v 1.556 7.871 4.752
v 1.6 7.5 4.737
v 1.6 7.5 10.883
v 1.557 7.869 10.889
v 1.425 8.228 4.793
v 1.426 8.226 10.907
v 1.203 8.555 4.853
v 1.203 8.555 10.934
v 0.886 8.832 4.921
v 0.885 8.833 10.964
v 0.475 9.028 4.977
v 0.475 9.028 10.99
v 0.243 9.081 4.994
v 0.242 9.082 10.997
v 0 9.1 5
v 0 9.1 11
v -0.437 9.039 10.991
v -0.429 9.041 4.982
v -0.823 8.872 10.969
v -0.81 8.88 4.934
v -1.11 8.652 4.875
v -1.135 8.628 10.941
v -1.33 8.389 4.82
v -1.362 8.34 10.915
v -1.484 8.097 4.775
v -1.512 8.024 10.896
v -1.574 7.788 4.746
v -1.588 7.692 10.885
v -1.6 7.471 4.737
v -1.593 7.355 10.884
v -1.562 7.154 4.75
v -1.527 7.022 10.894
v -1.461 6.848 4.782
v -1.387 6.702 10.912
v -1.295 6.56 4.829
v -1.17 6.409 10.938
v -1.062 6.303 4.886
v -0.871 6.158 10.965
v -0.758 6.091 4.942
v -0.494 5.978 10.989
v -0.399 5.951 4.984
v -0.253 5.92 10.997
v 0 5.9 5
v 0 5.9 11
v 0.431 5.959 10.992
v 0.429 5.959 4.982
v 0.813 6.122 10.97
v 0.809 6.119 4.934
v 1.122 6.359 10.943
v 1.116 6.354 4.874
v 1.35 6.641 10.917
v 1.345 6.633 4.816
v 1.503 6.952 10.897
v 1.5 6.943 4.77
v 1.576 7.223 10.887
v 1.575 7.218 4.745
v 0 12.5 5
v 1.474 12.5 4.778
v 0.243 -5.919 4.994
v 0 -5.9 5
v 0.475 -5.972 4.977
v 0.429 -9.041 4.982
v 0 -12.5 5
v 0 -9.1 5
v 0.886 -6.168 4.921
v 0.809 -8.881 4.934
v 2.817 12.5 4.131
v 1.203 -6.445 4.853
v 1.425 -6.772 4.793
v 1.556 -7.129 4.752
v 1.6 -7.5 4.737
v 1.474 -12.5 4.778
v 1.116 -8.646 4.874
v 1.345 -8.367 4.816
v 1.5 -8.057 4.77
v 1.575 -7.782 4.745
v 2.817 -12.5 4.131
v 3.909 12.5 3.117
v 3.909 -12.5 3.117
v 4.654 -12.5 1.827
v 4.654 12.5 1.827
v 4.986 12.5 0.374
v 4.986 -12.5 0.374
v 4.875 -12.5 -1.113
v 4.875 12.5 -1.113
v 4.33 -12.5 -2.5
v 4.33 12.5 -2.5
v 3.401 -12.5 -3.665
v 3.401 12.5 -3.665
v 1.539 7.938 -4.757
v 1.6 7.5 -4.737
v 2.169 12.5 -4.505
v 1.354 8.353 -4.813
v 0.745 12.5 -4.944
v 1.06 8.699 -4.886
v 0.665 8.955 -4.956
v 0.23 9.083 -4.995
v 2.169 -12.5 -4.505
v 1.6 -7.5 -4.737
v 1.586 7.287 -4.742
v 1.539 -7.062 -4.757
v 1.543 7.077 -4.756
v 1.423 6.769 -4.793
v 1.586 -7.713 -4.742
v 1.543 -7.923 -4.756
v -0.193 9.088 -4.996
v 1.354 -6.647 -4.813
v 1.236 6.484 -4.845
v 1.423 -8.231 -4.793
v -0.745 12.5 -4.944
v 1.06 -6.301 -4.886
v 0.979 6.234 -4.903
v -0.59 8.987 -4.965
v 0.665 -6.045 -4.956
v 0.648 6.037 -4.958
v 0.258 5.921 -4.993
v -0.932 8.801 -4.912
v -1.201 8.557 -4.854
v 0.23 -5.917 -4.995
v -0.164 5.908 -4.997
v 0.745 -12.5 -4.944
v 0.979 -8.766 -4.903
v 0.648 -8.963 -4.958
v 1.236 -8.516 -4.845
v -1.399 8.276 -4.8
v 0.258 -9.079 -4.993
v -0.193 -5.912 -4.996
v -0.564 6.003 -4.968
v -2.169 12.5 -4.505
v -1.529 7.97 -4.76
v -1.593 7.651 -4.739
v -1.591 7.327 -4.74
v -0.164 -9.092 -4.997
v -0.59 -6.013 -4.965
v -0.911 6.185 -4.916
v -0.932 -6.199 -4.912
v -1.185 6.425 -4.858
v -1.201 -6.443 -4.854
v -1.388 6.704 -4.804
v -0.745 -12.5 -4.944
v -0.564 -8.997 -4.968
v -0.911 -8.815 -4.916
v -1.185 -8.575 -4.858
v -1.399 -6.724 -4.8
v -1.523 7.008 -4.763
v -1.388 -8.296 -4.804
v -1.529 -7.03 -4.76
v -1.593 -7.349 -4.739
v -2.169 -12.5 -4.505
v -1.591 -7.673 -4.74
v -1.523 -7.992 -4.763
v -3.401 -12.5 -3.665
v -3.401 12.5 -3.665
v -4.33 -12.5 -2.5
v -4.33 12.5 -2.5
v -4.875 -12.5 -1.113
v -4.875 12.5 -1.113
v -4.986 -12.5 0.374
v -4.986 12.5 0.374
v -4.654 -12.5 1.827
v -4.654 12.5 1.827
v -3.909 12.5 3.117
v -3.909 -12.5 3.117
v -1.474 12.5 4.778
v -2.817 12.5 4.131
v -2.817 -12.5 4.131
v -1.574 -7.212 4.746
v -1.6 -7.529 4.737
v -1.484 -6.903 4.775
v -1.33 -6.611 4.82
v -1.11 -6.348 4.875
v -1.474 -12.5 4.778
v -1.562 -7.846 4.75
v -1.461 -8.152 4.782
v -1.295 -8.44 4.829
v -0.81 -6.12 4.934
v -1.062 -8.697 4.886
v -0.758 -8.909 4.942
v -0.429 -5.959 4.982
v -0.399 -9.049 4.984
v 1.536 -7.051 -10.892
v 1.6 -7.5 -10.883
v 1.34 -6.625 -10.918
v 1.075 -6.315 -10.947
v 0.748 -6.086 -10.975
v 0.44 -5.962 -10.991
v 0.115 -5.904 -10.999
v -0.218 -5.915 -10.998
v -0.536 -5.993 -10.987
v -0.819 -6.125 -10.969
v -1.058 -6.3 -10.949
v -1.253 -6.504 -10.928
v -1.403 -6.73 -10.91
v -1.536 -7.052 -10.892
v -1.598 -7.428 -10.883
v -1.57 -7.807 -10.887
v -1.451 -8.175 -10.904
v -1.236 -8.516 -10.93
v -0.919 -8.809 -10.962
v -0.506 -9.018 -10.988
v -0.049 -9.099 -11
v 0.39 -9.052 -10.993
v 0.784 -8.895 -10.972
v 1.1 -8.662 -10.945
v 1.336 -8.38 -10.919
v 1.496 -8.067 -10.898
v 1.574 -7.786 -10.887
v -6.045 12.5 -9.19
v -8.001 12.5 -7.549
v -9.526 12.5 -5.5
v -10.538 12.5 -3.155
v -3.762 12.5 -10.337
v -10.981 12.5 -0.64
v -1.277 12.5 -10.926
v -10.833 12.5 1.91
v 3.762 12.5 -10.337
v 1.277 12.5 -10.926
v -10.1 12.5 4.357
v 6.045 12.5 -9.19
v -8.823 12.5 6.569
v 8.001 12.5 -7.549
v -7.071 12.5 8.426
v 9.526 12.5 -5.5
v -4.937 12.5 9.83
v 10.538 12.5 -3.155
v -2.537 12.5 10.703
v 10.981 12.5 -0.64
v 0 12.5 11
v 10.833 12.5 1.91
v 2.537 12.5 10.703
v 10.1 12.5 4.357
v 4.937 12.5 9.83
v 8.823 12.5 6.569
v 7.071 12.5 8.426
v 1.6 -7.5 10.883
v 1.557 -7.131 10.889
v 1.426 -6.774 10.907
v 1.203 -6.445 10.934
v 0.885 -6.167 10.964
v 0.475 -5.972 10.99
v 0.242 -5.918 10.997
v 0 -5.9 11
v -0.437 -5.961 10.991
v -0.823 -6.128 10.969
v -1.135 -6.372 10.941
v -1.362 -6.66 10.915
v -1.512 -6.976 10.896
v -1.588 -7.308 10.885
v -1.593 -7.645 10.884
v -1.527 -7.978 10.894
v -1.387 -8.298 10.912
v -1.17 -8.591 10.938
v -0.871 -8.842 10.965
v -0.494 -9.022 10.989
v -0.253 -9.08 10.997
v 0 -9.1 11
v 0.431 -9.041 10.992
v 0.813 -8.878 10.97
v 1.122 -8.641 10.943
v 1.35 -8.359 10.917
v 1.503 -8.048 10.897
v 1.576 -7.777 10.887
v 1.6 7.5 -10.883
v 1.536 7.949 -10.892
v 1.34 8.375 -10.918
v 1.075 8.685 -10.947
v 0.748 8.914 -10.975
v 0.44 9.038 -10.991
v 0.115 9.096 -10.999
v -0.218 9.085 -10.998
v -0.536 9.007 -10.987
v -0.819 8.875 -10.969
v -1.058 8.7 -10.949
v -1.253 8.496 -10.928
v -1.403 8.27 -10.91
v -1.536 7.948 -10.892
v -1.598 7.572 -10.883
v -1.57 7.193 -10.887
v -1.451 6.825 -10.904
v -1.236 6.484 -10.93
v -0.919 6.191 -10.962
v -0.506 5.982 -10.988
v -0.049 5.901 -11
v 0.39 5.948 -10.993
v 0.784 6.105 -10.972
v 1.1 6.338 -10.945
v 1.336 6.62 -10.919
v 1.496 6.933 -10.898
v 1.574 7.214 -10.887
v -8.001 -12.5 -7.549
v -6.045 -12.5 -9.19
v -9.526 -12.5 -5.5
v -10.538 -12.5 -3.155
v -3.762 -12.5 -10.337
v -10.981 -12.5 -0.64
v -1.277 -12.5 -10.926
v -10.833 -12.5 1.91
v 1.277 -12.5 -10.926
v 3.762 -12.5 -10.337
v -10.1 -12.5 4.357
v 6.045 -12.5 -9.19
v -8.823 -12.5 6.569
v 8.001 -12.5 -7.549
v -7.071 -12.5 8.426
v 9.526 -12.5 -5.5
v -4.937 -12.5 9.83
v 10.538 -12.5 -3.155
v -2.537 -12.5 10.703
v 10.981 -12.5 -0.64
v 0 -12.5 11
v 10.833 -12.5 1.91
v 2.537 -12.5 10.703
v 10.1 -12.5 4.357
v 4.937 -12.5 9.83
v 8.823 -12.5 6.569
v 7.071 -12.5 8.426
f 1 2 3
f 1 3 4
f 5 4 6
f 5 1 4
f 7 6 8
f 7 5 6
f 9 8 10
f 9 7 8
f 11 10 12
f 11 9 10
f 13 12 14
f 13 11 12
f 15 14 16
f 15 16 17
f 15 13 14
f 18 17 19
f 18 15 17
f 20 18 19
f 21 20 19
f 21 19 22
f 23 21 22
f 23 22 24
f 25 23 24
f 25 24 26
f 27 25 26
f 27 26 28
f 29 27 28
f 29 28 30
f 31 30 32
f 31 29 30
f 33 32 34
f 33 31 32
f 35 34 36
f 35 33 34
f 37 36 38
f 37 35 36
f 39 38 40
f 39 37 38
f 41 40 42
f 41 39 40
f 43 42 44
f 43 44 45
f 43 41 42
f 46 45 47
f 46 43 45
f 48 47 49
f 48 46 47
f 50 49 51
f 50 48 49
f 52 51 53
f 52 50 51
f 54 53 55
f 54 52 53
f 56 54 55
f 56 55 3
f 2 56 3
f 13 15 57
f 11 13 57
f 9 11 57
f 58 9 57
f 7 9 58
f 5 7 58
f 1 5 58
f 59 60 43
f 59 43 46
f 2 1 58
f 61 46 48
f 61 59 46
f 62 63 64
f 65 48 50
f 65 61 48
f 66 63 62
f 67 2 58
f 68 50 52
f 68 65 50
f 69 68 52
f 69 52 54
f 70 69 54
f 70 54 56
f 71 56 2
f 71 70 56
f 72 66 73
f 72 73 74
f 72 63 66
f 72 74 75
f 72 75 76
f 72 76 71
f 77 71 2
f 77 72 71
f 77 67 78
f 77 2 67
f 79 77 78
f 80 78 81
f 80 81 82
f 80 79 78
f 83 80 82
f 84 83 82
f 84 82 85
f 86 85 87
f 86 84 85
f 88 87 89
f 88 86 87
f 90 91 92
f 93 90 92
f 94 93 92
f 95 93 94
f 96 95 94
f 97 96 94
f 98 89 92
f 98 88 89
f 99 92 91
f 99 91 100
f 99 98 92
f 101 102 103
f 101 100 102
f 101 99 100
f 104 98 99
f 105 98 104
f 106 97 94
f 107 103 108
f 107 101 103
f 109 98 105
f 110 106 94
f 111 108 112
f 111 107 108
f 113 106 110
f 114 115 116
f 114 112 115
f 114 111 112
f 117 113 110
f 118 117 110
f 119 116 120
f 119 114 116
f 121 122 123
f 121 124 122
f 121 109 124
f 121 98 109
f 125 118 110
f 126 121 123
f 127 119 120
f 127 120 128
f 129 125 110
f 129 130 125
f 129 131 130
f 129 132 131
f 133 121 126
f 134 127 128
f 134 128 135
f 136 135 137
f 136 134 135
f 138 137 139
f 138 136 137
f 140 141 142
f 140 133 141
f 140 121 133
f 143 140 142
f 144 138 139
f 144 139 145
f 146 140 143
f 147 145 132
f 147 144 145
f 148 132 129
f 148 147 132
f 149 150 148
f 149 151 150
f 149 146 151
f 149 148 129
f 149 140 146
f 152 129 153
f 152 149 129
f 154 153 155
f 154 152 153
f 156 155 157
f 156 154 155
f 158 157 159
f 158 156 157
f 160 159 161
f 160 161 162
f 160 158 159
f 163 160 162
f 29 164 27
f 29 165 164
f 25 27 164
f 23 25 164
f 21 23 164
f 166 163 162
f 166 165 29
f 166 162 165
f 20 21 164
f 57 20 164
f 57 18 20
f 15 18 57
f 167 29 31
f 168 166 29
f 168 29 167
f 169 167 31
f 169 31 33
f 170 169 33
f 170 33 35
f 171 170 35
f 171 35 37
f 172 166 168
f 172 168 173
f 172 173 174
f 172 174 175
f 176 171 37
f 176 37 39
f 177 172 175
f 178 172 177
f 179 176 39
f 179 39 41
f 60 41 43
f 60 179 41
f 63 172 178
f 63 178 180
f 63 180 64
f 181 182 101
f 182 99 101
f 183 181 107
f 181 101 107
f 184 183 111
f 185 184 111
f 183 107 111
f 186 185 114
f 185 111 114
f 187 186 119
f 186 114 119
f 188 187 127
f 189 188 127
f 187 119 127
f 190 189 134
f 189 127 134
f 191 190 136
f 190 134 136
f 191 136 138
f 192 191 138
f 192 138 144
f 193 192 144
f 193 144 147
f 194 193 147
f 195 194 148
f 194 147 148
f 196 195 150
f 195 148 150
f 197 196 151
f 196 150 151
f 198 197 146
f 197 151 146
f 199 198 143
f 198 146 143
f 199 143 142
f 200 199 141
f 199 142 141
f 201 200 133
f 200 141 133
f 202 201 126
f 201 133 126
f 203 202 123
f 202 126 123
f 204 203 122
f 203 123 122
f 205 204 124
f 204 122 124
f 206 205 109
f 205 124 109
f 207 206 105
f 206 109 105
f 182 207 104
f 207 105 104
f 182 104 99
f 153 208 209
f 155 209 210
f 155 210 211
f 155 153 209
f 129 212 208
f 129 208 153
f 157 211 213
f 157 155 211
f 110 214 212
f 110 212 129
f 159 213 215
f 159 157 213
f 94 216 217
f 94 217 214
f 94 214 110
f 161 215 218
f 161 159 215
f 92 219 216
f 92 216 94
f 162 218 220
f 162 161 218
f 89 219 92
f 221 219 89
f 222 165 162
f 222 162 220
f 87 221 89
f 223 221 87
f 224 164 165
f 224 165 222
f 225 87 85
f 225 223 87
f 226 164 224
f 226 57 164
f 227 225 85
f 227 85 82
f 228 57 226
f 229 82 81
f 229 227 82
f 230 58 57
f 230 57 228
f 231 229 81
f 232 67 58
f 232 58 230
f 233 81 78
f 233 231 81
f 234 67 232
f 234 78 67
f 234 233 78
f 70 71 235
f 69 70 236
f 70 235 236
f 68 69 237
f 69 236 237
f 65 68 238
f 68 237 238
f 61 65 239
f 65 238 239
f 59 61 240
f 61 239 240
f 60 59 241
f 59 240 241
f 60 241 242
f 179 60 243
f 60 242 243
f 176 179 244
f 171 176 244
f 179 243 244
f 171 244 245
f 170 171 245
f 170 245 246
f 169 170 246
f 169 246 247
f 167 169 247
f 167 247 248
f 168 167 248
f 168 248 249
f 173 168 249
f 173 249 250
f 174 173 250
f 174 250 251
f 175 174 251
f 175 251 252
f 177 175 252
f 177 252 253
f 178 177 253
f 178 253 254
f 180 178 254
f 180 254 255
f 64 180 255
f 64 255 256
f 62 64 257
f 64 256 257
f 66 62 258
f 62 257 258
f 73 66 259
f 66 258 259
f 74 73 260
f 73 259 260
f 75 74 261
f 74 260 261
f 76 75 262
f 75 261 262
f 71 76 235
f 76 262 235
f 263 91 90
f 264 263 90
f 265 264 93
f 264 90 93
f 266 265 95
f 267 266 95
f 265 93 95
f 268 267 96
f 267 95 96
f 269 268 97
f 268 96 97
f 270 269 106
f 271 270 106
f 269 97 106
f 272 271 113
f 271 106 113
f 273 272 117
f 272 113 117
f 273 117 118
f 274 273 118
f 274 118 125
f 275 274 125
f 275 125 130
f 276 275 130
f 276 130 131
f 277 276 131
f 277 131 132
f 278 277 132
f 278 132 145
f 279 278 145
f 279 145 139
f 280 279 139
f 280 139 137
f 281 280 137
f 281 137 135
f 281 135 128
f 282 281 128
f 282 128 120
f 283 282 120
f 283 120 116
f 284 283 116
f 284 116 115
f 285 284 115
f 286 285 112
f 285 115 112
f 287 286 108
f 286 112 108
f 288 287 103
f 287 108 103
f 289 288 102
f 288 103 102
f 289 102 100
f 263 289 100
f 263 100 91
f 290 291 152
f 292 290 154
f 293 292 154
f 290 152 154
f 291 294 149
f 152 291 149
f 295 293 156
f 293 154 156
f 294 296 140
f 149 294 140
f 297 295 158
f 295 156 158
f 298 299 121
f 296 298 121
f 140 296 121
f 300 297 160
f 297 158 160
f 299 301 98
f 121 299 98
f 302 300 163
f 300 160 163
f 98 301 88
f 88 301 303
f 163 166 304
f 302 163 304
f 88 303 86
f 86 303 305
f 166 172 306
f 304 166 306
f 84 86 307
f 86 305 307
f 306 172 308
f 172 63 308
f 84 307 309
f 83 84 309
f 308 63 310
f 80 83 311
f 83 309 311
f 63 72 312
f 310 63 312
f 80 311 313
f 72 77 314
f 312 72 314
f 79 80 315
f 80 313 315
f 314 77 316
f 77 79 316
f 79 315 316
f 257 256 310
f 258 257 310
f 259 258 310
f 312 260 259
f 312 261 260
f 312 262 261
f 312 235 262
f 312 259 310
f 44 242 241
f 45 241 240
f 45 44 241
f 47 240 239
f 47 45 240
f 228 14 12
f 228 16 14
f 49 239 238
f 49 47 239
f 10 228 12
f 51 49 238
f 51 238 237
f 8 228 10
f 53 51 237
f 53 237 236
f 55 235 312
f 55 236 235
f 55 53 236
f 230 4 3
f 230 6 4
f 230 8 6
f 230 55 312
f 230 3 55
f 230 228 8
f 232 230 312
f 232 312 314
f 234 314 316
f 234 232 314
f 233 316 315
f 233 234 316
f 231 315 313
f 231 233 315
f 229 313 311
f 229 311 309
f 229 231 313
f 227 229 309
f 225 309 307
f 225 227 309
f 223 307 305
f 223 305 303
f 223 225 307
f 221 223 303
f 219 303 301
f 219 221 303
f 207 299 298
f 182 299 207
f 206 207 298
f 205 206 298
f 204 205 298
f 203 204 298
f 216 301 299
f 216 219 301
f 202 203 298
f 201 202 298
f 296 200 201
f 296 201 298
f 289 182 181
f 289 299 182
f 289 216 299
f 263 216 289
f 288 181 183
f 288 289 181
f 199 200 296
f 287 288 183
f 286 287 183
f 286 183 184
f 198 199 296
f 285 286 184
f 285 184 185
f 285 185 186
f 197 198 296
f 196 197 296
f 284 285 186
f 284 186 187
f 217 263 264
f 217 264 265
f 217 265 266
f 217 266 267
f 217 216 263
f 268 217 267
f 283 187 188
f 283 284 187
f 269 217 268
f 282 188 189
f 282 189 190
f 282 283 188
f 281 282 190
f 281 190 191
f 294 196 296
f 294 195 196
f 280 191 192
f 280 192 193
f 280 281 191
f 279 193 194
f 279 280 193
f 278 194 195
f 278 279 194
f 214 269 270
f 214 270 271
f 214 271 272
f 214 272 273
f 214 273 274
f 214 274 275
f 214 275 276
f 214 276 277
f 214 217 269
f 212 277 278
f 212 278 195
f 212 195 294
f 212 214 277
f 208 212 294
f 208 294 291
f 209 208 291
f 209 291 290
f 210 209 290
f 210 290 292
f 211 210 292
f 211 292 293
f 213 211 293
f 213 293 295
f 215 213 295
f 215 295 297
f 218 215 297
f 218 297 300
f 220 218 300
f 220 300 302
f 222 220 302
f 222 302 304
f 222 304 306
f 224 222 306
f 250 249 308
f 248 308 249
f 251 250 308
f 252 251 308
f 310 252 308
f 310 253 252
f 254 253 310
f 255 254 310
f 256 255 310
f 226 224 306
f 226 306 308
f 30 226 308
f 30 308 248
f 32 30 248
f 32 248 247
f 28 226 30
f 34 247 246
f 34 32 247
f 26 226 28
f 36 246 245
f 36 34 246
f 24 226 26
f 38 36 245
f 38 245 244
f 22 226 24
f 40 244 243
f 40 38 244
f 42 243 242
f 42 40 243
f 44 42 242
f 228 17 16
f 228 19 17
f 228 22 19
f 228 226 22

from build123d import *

# Parameters (mm, degrees)
SKETCH_1_R          = 11
SKETCH_1_R_2        = 5
EXTRUDE_1_DEPTH     = 12.5
SKETCH_2_R          = 1.6
CUT_EXTRUDE_1_DEPTH = 12.5


with BuildPart() as part:
    # ｽｹｯﾁ1 → ﾎﾞｽ - 押し出し1 (new, symmetric)
    with BuildSketch(Plane(origin=(0, 0, 0), x_dir=(1, 0, 0), z_dir=(0, 1, 0))):
        with Locations(Location((0, 0, 0), (0, 0, 270))):
            Circle(SKETCH_1_R)
        with Locations(Location((0, 0, 0), (0, 0, 270))):
            Circle(SKETCH_1_R_2, mode=Mode.SUBTRACT)
    extrude(amount=EXTRUDE_1_DEPTH, both=True)

    # ｽｹｯﾁ2 → ｶｯﾄ - 押し出し1 (cut, symmetric)
    with BuildSketch(Plane.XY):
        with Locations((0, 7.5)):
            Circle(SKETCH_2_R)
        with Locations((0, -7.5)):
            Circle(SKETCH_2_R)
    extrude(amount=CUT_EXTRUDE_1_DEPTH, both=True, mode=Mode.SUBTRACT)


solid = part.part
